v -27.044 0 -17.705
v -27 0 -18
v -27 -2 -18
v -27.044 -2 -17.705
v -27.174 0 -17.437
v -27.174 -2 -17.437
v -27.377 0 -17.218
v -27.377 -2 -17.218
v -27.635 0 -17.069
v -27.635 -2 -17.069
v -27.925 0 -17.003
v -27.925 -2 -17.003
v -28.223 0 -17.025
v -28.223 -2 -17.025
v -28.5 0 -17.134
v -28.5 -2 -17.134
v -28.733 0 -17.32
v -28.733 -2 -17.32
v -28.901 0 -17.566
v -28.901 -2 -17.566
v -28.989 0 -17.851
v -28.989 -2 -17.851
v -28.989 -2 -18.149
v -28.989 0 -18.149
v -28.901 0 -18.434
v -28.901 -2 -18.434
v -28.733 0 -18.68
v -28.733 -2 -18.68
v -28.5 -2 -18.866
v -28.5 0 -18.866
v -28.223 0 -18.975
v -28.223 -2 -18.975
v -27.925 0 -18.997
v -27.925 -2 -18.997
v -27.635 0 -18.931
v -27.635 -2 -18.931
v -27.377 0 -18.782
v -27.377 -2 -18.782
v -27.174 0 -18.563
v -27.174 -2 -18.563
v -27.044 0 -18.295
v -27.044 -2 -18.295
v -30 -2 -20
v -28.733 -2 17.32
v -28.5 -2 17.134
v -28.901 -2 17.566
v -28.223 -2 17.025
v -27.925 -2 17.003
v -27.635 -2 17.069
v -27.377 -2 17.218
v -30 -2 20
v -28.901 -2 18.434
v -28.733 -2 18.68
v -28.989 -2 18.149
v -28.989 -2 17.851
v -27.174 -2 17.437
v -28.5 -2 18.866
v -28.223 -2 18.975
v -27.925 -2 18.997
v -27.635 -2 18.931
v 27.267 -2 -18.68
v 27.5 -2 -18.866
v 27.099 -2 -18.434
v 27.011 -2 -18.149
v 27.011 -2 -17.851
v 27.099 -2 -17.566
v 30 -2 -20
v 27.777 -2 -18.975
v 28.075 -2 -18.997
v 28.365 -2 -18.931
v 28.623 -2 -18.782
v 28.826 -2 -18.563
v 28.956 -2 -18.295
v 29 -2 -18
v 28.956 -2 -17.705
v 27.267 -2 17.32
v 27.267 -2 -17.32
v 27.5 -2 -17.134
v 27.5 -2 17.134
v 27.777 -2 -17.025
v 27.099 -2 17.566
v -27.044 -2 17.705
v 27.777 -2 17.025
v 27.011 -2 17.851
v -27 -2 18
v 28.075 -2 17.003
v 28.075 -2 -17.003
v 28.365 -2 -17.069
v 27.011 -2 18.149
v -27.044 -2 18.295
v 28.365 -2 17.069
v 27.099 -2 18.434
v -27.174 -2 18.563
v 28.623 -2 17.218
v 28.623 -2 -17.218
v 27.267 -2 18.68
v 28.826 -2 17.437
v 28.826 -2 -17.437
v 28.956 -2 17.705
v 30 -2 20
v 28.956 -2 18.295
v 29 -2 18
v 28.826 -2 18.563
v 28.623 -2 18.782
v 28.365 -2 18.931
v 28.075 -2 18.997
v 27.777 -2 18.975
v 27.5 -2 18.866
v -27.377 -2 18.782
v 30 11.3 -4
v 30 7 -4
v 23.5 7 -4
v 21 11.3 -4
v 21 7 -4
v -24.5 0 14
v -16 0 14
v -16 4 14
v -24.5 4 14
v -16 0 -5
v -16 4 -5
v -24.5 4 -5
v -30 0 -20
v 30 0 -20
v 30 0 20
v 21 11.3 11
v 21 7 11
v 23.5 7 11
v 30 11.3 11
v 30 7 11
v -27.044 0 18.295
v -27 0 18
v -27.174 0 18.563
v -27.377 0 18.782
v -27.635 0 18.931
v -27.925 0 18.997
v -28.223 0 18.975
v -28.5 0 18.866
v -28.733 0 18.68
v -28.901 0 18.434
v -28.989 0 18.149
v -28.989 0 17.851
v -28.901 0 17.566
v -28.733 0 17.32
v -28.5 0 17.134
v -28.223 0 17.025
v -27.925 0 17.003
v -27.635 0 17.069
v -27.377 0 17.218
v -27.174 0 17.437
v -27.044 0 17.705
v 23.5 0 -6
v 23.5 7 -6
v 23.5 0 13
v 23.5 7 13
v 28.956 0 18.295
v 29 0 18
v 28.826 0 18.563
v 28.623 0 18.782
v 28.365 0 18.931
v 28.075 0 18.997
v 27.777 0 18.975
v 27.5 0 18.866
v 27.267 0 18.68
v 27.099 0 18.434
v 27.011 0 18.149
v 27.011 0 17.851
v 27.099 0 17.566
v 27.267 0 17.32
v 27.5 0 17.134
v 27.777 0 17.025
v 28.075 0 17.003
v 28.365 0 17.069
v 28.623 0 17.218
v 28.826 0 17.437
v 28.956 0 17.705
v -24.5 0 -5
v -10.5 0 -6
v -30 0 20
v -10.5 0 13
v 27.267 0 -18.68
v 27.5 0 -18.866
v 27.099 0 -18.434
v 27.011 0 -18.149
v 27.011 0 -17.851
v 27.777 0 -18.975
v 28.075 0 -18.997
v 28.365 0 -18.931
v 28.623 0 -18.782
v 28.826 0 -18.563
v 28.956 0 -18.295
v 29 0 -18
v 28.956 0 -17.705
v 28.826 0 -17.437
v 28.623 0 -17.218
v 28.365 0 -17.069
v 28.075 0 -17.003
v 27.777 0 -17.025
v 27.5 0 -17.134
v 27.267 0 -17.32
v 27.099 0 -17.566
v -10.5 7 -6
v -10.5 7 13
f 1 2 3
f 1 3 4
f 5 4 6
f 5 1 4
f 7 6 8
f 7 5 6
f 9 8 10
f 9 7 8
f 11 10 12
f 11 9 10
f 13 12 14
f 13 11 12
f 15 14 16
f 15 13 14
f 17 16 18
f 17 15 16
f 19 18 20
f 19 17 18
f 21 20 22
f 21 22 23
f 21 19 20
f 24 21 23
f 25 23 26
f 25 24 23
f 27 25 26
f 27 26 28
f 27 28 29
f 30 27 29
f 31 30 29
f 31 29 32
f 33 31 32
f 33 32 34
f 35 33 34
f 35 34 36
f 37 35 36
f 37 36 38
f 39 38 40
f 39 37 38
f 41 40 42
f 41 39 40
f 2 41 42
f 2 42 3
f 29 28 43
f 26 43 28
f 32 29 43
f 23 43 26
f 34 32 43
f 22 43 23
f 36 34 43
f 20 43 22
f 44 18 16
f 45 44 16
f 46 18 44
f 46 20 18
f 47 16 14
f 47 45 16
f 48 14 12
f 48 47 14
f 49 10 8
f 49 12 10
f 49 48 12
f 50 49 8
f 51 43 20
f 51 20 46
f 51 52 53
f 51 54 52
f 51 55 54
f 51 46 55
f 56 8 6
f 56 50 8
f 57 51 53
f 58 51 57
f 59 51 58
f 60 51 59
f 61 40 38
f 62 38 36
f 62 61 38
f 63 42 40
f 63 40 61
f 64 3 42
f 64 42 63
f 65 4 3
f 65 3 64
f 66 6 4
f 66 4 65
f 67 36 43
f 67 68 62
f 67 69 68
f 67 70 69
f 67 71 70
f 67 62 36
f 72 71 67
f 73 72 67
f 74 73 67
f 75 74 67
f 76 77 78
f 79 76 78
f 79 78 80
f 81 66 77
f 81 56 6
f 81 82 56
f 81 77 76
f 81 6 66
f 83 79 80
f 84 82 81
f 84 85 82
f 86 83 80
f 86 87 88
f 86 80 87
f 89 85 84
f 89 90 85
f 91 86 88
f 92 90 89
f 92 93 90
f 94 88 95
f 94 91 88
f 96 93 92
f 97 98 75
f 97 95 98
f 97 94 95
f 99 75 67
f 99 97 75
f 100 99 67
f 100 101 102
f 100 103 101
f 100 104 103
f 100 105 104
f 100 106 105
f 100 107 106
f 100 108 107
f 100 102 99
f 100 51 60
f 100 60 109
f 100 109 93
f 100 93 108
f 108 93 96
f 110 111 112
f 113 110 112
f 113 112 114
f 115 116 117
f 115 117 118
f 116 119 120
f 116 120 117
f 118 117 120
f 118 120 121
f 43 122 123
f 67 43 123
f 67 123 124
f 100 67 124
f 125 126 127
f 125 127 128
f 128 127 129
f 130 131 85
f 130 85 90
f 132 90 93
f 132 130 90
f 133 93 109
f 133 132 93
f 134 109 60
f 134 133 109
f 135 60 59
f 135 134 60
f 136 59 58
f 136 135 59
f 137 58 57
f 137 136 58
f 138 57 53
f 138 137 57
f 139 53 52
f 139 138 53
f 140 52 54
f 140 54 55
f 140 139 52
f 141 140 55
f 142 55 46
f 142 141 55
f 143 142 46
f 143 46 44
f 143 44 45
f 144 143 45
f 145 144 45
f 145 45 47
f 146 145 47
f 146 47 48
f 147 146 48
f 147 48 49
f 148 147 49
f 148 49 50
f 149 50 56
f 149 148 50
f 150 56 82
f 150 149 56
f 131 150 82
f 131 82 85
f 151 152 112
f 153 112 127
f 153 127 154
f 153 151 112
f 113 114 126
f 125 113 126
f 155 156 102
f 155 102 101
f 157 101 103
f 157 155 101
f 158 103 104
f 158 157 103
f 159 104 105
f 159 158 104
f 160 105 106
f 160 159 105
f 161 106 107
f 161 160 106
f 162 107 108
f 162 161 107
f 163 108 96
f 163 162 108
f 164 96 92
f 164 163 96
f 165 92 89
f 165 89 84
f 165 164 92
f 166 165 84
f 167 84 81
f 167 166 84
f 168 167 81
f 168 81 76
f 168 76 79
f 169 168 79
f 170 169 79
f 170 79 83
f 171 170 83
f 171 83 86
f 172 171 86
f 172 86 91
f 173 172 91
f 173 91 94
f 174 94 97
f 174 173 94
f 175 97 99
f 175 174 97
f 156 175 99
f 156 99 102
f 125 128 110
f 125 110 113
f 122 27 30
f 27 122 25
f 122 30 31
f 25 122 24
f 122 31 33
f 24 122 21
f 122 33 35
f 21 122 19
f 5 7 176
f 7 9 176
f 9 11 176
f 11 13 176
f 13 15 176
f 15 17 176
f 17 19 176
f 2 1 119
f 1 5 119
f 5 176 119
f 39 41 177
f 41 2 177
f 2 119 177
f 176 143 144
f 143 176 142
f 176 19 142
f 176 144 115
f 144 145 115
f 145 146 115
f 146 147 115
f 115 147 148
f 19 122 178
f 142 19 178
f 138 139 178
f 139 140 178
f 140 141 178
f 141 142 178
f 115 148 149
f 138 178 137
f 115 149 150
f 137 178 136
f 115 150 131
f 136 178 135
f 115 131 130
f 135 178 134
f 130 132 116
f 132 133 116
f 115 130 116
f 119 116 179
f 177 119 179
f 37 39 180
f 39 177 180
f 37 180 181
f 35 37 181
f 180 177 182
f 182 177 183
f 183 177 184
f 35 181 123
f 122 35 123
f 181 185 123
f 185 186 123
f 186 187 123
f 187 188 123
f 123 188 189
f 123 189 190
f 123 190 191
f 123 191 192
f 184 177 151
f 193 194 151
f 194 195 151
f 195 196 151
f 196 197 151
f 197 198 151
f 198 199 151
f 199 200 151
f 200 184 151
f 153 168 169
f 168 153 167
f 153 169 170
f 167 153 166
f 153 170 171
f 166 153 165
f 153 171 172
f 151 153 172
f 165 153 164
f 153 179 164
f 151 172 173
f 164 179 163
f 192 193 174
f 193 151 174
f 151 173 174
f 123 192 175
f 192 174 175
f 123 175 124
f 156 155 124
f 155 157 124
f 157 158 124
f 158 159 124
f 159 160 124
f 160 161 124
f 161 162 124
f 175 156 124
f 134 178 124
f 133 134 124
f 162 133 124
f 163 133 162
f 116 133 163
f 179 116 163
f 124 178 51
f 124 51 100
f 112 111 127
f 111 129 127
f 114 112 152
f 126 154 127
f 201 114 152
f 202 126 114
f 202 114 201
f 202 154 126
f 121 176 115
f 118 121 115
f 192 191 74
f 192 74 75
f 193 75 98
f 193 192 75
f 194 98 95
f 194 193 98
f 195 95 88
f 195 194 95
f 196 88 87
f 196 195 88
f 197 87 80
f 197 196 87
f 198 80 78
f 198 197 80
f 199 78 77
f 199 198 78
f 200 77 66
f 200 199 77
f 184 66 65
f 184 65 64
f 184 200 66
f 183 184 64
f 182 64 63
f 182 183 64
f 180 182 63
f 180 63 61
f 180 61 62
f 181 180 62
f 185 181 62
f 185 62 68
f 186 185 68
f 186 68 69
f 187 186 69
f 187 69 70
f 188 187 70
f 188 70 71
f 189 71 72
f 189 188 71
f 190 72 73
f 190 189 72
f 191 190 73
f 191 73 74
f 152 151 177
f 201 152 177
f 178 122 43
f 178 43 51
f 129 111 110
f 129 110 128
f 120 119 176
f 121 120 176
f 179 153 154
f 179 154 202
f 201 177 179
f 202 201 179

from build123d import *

# Parameters (mm, degrees)
F0_W     = 60
F0_H     = 40
F0_R     = 1
F1_DEPTH = 2
F2_W     = 8.5
F2_H     = 19
F3_DEPTH = 4
F4_W     = 34
F4_H     = 19
F5_DEPTH = 7
F6_W     = 2.5
F6_H     = 15
F6_W_2   = 6.5
F7_DEPTH = 4.3


with BuildPart() as f1:
    # F0 (on Front) → F1 (new body)
    with BuildSketch(Plane.XZ):
        Rectangle(F0_W, F0_H)
        with Locations((-28, -18)):
            Circle(F0_R, mode=Mode.SUBTRACT)
        with Locations((28, -18)):
            Circle(F0_R, mode=Mode.SUBTRACT)
        with Locations((-28, 18)):
            Circle(F0_R, mode=Mode.SUBTRACT)
        with Locations((28, 18)):
            Circle(F0_R, mode=Mode.SUBTRACT)
    extrude(amount=F1_DEPTH)

    # F2 (on face) → F3 (join)
    with BuildSketch(Plane(origin=(0, 0, 0), x_dir=(-1, 0, 0), z_dir=(0, 1, 0))):
        with Locations((20.25, 4.5)):
            Rectangle(F2_W, F2_H)
    extrude(amount=F3_DEPTH)

    # F4 (on face) → F5 (join)
    with BuildSketch(Plane(origin=(0, 0, 0), x_dir=(-1, 0, 0), z_dir=(0, 1, 0))):
        with Locations((-6.5, 3.5)):
            Rectangle(F4_W, F4_H)
    extrude(amount=F5_DEPTH)

    # F6 (on face) → F7 (join)
    with BuildSketch(Plane(origin=(0, 7, 0), x_dir=(-1, 0, 0), z_dir=(0, 1, 0))):
        with Locations((-22.25, 3.5)):
            Rectangle(F6_W, F6_H)
        with Locations((-26.75, 3.5)):
            Rectangle(F6_W_2, F6_H)
    extrude(amount=F7_DEPTH)


solid = f1.part
